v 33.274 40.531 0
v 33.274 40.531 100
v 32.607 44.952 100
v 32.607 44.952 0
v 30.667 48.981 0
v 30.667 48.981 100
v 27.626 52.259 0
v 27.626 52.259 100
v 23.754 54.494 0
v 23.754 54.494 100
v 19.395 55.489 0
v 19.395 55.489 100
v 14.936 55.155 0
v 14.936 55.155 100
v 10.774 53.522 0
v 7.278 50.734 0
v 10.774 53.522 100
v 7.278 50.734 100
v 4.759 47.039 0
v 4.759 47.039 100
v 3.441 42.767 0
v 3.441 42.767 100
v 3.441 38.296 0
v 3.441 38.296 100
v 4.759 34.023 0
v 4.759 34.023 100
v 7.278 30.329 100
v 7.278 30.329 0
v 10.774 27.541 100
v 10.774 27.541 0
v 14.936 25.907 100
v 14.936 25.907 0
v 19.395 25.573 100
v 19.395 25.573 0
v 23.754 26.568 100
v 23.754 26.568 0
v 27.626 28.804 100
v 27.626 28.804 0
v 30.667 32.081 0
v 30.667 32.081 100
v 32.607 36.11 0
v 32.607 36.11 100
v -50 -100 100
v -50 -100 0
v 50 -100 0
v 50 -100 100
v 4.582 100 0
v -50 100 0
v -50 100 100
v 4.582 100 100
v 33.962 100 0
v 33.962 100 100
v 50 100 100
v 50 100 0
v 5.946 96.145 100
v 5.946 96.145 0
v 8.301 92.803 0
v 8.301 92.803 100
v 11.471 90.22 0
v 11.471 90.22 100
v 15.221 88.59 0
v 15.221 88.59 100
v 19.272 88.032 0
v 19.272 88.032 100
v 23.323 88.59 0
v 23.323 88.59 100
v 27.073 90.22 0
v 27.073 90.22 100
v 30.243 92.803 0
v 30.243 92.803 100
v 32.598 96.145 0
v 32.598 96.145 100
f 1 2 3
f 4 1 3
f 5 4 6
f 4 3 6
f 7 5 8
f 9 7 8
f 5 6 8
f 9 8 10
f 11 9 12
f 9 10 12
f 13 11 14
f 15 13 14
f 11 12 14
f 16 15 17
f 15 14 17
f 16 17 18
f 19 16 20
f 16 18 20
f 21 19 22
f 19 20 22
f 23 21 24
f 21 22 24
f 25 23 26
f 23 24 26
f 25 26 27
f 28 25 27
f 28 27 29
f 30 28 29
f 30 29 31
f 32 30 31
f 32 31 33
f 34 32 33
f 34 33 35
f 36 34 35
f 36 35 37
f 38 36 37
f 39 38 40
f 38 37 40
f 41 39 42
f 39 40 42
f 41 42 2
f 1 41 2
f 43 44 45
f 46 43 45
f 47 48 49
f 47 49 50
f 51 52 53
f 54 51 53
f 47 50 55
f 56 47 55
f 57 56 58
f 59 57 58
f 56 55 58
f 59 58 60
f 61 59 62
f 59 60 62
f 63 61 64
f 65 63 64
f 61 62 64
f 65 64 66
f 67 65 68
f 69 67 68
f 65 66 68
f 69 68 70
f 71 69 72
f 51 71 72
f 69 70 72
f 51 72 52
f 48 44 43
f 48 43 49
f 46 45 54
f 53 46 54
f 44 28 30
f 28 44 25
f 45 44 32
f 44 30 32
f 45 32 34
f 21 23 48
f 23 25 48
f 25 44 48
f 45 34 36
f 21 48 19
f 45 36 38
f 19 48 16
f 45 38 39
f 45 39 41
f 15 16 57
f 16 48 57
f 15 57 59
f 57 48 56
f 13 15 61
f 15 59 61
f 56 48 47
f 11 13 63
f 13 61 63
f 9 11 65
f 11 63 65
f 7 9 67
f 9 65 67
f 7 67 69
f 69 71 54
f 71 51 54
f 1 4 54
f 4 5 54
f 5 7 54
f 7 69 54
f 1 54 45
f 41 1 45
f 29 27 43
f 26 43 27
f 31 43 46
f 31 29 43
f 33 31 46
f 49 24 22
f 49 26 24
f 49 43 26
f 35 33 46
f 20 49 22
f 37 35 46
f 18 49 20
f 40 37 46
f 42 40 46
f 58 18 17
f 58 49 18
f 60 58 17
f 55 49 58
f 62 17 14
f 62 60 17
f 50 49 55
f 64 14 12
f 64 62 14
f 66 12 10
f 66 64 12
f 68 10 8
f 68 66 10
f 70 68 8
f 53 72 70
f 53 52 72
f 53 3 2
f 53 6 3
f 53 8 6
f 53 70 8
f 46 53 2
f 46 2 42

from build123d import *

# Parameters (mm, degrees)
F0_W     = 100
F0_H     = 200
F1_DEPTH = 100
F2_R     = 15
F3_DEPTH = 100
F5_DEPTH = 100


with BuildPart() as f1:
    # F0 (on Top) → F1 (new body)
    with BuildSketch(Plane.XY):
        Rectangle(F0_W, F0_H)
    extrude(amount=F1_DEPTH)

    # F2 (on face) → F3 (cut)
    with BuildSketch(Plane.XY.offset(100)):
        with Locations((18.2735839133, 40.5311594063)):
            Circle(F2_R)
    extrude(amount=-F3_DEPTH, mode=Mode.SUBTRACT)

    # F4 (on face) → F5 (cut)
    with BuildSketch(Plane.XY.offset(100)):
        with BuildLine():
            Line((33.9623928101, 100), (4.5817479461, 100))
            ThreePointArc((4.5817479461, 100), (19.2720703781, 88.0322313309), (33.9623928101, 100))
        make_face()
        with BuildLine():
            ThreePointArc((33.9623928101, 100), (34.1944501561, 101.5082294411), (34.2720703781, 103.0322313309))
            ThreePointArc((34.2720703781, 103.0322313309), (17.7480684883, 117.9546111089), (4.5817479461, 100))
            Line((4.5817479461, 100), (33.9623928101, 100))
        make_face()
    extrude(amount=-F5_DEPTH, mode=Mode.SUBTRACT)


solid = f1.part
